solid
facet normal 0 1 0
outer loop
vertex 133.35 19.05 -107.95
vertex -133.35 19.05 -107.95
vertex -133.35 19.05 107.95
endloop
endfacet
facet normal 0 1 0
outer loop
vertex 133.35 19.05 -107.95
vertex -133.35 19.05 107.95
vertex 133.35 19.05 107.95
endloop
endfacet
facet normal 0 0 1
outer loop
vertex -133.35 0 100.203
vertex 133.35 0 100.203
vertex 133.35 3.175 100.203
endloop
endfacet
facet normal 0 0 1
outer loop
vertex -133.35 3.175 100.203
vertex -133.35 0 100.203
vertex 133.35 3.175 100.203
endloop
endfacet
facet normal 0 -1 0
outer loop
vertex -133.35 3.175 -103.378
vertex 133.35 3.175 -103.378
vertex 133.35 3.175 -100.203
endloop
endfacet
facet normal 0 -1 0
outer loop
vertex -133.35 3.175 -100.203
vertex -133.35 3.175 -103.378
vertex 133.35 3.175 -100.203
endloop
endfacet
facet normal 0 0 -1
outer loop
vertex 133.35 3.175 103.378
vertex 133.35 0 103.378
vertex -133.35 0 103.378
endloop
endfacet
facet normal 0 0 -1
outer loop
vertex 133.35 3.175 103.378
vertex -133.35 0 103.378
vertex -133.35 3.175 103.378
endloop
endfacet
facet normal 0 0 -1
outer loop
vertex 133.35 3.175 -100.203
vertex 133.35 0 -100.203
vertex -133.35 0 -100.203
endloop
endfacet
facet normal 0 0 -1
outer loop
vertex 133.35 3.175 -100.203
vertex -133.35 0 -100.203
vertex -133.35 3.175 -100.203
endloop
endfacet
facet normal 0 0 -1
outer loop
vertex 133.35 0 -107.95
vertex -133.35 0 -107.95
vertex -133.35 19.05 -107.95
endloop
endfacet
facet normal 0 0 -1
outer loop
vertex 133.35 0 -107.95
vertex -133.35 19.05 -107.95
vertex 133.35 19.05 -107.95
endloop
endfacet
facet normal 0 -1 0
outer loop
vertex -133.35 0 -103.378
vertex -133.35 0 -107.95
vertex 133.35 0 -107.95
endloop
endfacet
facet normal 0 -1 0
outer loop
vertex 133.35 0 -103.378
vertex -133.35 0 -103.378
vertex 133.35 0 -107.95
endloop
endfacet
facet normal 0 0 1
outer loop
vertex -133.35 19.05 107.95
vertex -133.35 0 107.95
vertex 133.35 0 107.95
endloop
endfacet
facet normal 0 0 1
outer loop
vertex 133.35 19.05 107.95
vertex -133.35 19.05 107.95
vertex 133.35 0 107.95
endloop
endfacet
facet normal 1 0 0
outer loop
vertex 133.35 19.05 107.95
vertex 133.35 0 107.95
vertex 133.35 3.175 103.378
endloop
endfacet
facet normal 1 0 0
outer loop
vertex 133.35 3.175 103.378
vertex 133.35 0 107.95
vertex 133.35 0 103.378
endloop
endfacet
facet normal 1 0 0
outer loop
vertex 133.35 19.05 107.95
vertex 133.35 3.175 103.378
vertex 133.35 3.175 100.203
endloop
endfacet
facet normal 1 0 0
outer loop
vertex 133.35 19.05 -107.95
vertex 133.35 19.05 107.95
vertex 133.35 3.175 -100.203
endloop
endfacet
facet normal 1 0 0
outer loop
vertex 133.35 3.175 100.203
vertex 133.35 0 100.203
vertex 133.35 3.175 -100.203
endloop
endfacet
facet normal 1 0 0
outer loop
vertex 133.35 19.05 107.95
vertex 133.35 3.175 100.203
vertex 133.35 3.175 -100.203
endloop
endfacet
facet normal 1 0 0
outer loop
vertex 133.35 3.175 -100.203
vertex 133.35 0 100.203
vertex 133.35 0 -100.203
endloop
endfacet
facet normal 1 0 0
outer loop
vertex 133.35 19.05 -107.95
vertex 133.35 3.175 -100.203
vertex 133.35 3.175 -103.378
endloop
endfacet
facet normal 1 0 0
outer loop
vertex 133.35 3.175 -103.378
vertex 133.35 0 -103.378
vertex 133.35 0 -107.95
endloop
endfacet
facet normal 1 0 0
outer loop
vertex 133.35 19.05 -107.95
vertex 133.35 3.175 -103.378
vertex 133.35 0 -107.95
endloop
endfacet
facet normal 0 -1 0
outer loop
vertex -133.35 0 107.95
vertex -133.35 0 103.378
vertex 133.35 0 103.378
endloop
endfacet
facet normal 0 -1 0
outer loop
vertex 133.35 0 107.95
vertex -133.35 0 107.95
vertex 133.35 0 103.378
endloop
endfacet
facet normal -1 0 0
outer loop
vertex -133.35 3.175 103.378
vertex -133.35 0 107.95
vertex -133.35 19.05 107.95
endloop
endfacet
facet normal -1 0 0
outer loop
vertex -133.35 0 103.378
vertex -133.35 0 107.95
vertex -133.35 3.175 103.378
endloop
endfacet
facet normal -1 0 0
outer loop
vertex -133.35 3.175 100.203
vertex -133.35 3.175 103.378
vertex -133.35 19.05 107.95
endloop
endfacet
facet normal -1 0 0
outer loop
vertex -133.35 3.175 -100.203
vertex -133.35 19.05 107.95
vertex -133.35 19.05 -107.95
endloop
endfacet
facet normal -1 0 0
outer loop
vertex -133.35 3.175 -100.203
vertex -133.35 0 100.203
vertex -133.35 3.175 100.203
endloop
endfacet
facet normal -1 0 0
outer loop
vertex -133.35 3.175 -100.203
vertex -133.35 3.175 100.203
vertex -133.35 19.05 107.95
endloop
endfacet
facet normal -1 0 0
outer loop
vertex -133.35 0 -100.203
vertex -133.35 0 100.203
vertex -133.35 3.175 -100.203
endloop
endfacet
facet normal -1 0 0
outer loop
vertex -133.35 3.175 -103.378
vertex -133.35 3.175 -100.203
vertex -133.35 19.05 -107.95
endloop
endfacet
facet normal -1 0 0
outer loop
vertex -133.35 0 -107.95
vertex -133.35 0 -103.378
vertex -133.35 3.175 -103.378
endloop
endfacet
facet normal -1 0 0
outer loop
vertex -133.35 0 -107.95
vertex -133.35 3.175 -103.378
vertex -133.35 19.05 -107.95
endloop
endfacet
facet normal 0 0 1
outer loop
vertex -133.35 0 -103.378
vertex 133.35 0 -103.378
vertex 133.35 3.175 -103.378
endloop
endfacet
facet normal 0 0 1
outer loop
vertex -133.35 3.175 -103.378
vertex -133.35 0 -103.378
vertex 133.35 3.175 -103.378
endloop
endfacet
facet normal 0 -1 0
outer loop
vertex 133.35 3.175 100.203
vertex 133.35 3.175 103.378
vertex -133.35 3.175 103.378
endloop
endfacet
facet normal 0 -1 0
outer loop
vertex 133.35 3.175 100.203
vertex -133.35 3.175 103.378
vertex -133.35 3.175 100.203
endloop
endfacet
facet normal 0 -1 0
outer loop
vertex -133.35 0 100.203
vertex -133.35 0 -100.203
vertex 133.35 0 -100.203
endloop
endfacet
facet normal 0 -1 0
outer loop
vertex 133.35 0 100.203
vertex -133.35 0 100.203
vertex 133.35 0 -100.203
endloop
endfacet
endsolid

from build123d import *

# Parameters (mm, degrees)
SKETCH1_W           = 266.7
SKETCH1_H           = 215.9
BOSS_EXTRUDE1_DEPTH = 19.05
SKETCH3_W           = 3.175
SKETCH3_H           = 3.175
CUT_EXTRUDE2_DEPTH  = 134.35


with BuildPart() as part:
    # Sketch1 → Boss-Extrude1 (new body)
    with BuildSketch(Plane(origin=(0, 0, 0), x_dir=(1, 0, 0), z_dir=(0, 1, 0))):
        Rectangle(SKETCH1_W, SKETCH1_H)
    extrude(amount=BOSS_EXTRUDE1_DEPTH)

    # Sketch3 → Cut-Extrude2 (cut, symmetric)
    with BuildSketch(Plane(origin=(0, 0, 0), x_dir=(0, 0, -1), z_dir=(1, 0, 0))):
        with Locations((-101.7905, 1.5875)):
            Rectangle(SKETCH3_W, SKETCH3_H)
    cut_extrude2 = extrude(amount=CUT_EXTRUDE2_DEPTH, both=True, mode=Mode.SUBTRACT)

    # Mirror2: Cut-Extrude2 across plane
    add(cut_extrude2.mirror(Plane.XY), mode=Mode.SUBTRACT)


solid = part.part
